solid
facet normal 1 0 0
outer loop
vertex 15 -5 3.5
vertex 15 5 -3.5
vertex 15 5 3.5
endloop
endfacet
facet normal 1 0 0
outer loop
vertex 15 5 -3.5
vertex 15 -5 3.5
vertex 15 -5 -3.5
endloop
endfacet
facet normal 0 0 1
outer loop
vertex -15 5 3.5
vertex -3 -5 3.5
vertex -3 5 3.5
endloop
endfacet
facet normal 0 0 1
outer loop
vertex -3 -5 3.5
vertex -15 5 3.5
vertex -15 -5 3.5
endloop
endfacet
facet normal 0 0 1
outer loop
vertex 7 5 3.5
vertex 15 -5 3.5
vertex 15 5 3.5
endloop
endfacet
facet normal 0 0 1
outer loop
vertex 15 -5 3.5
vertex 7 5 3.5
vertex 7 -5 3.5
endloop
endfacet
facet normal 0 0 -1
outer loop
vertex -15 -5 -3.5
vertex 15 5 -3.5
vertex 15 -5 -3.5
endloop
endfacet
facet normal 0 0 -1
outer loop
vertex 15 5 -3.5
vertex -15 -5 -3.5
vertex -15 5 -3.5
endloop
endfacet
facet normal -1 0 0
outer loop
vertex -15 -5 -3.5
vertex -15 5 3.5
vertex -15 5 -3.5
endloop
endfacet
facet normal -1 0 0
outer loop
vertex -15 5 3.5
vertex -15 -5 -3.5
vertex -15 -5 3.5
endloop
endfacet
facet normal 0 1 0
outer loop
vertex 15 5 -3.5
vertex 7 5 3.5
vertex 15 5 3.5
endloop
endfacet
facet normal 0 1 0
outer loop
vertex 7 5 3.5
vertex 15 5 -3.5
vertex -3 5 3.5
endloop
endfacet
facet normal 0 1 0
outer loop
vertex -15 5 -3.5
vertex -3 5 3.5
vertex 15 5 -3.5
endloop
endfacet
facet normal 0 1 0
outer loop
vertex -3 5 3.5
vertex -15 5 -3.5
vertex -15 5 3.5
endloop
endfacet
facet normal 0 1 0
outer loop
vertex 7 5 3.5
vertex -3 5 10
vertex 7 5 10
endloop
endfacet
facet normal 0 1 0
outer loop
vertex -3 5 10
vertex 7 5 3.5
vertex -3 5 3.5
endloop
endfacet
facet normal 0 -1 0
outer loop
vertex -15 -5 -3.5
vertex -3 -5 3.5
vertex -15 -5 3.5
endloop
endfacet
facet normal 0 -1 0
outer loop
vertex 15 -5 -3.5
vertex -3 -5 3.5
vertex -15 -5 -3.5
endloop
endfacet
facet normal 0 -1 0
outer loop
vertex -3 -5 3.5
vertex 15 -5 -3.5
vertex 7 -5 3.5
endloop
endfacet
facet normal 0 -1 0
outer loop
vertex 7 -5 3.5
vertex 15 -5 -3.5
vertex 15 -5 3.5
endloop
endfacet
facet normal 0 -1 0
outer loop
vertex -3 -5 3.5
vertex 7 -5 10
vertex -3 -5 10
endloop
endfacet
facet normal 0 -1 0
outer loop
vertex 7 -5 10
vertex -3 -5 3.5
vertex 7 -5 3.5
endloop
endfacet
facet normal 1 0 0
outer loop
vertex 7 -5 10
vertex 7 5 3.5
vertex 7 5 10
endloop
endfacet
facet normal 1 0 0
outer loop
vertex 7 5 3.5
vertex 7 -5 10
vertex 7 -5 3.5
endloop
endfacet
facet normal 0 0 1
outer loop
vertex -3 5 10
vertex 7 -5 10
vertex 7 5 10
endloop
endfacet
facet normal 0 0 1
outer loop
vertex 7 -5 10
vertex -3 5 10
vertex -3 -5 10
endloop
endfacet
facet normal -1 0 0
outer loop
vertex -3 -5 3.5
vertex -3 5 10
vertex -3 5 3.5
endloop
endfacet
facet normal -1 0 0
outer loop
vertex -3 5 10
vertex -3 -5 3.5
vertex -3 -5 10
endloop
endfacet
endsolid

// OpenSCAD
$fn=300;

//chassi
cube([30,10,7],center=true);
//cabine
translate([-3,-5,0])cube([10,10,10]);
//roda direita dianteira
rotate([90,0,0])
    translate([10,-2,5])
    circle(4.5);
//roda esquerda dianteira
rotate([90,0,0])
    translate([10,-2,-5])
    circle(4.5);
//roda esquerda traseira
rotate([90,0,0])
    translate([-10,-2,-5])
    circle(4.5);
//roda direita traseira
rotate([90,0,0])
    translate([-10,-2,5])
    circle(4.5);
